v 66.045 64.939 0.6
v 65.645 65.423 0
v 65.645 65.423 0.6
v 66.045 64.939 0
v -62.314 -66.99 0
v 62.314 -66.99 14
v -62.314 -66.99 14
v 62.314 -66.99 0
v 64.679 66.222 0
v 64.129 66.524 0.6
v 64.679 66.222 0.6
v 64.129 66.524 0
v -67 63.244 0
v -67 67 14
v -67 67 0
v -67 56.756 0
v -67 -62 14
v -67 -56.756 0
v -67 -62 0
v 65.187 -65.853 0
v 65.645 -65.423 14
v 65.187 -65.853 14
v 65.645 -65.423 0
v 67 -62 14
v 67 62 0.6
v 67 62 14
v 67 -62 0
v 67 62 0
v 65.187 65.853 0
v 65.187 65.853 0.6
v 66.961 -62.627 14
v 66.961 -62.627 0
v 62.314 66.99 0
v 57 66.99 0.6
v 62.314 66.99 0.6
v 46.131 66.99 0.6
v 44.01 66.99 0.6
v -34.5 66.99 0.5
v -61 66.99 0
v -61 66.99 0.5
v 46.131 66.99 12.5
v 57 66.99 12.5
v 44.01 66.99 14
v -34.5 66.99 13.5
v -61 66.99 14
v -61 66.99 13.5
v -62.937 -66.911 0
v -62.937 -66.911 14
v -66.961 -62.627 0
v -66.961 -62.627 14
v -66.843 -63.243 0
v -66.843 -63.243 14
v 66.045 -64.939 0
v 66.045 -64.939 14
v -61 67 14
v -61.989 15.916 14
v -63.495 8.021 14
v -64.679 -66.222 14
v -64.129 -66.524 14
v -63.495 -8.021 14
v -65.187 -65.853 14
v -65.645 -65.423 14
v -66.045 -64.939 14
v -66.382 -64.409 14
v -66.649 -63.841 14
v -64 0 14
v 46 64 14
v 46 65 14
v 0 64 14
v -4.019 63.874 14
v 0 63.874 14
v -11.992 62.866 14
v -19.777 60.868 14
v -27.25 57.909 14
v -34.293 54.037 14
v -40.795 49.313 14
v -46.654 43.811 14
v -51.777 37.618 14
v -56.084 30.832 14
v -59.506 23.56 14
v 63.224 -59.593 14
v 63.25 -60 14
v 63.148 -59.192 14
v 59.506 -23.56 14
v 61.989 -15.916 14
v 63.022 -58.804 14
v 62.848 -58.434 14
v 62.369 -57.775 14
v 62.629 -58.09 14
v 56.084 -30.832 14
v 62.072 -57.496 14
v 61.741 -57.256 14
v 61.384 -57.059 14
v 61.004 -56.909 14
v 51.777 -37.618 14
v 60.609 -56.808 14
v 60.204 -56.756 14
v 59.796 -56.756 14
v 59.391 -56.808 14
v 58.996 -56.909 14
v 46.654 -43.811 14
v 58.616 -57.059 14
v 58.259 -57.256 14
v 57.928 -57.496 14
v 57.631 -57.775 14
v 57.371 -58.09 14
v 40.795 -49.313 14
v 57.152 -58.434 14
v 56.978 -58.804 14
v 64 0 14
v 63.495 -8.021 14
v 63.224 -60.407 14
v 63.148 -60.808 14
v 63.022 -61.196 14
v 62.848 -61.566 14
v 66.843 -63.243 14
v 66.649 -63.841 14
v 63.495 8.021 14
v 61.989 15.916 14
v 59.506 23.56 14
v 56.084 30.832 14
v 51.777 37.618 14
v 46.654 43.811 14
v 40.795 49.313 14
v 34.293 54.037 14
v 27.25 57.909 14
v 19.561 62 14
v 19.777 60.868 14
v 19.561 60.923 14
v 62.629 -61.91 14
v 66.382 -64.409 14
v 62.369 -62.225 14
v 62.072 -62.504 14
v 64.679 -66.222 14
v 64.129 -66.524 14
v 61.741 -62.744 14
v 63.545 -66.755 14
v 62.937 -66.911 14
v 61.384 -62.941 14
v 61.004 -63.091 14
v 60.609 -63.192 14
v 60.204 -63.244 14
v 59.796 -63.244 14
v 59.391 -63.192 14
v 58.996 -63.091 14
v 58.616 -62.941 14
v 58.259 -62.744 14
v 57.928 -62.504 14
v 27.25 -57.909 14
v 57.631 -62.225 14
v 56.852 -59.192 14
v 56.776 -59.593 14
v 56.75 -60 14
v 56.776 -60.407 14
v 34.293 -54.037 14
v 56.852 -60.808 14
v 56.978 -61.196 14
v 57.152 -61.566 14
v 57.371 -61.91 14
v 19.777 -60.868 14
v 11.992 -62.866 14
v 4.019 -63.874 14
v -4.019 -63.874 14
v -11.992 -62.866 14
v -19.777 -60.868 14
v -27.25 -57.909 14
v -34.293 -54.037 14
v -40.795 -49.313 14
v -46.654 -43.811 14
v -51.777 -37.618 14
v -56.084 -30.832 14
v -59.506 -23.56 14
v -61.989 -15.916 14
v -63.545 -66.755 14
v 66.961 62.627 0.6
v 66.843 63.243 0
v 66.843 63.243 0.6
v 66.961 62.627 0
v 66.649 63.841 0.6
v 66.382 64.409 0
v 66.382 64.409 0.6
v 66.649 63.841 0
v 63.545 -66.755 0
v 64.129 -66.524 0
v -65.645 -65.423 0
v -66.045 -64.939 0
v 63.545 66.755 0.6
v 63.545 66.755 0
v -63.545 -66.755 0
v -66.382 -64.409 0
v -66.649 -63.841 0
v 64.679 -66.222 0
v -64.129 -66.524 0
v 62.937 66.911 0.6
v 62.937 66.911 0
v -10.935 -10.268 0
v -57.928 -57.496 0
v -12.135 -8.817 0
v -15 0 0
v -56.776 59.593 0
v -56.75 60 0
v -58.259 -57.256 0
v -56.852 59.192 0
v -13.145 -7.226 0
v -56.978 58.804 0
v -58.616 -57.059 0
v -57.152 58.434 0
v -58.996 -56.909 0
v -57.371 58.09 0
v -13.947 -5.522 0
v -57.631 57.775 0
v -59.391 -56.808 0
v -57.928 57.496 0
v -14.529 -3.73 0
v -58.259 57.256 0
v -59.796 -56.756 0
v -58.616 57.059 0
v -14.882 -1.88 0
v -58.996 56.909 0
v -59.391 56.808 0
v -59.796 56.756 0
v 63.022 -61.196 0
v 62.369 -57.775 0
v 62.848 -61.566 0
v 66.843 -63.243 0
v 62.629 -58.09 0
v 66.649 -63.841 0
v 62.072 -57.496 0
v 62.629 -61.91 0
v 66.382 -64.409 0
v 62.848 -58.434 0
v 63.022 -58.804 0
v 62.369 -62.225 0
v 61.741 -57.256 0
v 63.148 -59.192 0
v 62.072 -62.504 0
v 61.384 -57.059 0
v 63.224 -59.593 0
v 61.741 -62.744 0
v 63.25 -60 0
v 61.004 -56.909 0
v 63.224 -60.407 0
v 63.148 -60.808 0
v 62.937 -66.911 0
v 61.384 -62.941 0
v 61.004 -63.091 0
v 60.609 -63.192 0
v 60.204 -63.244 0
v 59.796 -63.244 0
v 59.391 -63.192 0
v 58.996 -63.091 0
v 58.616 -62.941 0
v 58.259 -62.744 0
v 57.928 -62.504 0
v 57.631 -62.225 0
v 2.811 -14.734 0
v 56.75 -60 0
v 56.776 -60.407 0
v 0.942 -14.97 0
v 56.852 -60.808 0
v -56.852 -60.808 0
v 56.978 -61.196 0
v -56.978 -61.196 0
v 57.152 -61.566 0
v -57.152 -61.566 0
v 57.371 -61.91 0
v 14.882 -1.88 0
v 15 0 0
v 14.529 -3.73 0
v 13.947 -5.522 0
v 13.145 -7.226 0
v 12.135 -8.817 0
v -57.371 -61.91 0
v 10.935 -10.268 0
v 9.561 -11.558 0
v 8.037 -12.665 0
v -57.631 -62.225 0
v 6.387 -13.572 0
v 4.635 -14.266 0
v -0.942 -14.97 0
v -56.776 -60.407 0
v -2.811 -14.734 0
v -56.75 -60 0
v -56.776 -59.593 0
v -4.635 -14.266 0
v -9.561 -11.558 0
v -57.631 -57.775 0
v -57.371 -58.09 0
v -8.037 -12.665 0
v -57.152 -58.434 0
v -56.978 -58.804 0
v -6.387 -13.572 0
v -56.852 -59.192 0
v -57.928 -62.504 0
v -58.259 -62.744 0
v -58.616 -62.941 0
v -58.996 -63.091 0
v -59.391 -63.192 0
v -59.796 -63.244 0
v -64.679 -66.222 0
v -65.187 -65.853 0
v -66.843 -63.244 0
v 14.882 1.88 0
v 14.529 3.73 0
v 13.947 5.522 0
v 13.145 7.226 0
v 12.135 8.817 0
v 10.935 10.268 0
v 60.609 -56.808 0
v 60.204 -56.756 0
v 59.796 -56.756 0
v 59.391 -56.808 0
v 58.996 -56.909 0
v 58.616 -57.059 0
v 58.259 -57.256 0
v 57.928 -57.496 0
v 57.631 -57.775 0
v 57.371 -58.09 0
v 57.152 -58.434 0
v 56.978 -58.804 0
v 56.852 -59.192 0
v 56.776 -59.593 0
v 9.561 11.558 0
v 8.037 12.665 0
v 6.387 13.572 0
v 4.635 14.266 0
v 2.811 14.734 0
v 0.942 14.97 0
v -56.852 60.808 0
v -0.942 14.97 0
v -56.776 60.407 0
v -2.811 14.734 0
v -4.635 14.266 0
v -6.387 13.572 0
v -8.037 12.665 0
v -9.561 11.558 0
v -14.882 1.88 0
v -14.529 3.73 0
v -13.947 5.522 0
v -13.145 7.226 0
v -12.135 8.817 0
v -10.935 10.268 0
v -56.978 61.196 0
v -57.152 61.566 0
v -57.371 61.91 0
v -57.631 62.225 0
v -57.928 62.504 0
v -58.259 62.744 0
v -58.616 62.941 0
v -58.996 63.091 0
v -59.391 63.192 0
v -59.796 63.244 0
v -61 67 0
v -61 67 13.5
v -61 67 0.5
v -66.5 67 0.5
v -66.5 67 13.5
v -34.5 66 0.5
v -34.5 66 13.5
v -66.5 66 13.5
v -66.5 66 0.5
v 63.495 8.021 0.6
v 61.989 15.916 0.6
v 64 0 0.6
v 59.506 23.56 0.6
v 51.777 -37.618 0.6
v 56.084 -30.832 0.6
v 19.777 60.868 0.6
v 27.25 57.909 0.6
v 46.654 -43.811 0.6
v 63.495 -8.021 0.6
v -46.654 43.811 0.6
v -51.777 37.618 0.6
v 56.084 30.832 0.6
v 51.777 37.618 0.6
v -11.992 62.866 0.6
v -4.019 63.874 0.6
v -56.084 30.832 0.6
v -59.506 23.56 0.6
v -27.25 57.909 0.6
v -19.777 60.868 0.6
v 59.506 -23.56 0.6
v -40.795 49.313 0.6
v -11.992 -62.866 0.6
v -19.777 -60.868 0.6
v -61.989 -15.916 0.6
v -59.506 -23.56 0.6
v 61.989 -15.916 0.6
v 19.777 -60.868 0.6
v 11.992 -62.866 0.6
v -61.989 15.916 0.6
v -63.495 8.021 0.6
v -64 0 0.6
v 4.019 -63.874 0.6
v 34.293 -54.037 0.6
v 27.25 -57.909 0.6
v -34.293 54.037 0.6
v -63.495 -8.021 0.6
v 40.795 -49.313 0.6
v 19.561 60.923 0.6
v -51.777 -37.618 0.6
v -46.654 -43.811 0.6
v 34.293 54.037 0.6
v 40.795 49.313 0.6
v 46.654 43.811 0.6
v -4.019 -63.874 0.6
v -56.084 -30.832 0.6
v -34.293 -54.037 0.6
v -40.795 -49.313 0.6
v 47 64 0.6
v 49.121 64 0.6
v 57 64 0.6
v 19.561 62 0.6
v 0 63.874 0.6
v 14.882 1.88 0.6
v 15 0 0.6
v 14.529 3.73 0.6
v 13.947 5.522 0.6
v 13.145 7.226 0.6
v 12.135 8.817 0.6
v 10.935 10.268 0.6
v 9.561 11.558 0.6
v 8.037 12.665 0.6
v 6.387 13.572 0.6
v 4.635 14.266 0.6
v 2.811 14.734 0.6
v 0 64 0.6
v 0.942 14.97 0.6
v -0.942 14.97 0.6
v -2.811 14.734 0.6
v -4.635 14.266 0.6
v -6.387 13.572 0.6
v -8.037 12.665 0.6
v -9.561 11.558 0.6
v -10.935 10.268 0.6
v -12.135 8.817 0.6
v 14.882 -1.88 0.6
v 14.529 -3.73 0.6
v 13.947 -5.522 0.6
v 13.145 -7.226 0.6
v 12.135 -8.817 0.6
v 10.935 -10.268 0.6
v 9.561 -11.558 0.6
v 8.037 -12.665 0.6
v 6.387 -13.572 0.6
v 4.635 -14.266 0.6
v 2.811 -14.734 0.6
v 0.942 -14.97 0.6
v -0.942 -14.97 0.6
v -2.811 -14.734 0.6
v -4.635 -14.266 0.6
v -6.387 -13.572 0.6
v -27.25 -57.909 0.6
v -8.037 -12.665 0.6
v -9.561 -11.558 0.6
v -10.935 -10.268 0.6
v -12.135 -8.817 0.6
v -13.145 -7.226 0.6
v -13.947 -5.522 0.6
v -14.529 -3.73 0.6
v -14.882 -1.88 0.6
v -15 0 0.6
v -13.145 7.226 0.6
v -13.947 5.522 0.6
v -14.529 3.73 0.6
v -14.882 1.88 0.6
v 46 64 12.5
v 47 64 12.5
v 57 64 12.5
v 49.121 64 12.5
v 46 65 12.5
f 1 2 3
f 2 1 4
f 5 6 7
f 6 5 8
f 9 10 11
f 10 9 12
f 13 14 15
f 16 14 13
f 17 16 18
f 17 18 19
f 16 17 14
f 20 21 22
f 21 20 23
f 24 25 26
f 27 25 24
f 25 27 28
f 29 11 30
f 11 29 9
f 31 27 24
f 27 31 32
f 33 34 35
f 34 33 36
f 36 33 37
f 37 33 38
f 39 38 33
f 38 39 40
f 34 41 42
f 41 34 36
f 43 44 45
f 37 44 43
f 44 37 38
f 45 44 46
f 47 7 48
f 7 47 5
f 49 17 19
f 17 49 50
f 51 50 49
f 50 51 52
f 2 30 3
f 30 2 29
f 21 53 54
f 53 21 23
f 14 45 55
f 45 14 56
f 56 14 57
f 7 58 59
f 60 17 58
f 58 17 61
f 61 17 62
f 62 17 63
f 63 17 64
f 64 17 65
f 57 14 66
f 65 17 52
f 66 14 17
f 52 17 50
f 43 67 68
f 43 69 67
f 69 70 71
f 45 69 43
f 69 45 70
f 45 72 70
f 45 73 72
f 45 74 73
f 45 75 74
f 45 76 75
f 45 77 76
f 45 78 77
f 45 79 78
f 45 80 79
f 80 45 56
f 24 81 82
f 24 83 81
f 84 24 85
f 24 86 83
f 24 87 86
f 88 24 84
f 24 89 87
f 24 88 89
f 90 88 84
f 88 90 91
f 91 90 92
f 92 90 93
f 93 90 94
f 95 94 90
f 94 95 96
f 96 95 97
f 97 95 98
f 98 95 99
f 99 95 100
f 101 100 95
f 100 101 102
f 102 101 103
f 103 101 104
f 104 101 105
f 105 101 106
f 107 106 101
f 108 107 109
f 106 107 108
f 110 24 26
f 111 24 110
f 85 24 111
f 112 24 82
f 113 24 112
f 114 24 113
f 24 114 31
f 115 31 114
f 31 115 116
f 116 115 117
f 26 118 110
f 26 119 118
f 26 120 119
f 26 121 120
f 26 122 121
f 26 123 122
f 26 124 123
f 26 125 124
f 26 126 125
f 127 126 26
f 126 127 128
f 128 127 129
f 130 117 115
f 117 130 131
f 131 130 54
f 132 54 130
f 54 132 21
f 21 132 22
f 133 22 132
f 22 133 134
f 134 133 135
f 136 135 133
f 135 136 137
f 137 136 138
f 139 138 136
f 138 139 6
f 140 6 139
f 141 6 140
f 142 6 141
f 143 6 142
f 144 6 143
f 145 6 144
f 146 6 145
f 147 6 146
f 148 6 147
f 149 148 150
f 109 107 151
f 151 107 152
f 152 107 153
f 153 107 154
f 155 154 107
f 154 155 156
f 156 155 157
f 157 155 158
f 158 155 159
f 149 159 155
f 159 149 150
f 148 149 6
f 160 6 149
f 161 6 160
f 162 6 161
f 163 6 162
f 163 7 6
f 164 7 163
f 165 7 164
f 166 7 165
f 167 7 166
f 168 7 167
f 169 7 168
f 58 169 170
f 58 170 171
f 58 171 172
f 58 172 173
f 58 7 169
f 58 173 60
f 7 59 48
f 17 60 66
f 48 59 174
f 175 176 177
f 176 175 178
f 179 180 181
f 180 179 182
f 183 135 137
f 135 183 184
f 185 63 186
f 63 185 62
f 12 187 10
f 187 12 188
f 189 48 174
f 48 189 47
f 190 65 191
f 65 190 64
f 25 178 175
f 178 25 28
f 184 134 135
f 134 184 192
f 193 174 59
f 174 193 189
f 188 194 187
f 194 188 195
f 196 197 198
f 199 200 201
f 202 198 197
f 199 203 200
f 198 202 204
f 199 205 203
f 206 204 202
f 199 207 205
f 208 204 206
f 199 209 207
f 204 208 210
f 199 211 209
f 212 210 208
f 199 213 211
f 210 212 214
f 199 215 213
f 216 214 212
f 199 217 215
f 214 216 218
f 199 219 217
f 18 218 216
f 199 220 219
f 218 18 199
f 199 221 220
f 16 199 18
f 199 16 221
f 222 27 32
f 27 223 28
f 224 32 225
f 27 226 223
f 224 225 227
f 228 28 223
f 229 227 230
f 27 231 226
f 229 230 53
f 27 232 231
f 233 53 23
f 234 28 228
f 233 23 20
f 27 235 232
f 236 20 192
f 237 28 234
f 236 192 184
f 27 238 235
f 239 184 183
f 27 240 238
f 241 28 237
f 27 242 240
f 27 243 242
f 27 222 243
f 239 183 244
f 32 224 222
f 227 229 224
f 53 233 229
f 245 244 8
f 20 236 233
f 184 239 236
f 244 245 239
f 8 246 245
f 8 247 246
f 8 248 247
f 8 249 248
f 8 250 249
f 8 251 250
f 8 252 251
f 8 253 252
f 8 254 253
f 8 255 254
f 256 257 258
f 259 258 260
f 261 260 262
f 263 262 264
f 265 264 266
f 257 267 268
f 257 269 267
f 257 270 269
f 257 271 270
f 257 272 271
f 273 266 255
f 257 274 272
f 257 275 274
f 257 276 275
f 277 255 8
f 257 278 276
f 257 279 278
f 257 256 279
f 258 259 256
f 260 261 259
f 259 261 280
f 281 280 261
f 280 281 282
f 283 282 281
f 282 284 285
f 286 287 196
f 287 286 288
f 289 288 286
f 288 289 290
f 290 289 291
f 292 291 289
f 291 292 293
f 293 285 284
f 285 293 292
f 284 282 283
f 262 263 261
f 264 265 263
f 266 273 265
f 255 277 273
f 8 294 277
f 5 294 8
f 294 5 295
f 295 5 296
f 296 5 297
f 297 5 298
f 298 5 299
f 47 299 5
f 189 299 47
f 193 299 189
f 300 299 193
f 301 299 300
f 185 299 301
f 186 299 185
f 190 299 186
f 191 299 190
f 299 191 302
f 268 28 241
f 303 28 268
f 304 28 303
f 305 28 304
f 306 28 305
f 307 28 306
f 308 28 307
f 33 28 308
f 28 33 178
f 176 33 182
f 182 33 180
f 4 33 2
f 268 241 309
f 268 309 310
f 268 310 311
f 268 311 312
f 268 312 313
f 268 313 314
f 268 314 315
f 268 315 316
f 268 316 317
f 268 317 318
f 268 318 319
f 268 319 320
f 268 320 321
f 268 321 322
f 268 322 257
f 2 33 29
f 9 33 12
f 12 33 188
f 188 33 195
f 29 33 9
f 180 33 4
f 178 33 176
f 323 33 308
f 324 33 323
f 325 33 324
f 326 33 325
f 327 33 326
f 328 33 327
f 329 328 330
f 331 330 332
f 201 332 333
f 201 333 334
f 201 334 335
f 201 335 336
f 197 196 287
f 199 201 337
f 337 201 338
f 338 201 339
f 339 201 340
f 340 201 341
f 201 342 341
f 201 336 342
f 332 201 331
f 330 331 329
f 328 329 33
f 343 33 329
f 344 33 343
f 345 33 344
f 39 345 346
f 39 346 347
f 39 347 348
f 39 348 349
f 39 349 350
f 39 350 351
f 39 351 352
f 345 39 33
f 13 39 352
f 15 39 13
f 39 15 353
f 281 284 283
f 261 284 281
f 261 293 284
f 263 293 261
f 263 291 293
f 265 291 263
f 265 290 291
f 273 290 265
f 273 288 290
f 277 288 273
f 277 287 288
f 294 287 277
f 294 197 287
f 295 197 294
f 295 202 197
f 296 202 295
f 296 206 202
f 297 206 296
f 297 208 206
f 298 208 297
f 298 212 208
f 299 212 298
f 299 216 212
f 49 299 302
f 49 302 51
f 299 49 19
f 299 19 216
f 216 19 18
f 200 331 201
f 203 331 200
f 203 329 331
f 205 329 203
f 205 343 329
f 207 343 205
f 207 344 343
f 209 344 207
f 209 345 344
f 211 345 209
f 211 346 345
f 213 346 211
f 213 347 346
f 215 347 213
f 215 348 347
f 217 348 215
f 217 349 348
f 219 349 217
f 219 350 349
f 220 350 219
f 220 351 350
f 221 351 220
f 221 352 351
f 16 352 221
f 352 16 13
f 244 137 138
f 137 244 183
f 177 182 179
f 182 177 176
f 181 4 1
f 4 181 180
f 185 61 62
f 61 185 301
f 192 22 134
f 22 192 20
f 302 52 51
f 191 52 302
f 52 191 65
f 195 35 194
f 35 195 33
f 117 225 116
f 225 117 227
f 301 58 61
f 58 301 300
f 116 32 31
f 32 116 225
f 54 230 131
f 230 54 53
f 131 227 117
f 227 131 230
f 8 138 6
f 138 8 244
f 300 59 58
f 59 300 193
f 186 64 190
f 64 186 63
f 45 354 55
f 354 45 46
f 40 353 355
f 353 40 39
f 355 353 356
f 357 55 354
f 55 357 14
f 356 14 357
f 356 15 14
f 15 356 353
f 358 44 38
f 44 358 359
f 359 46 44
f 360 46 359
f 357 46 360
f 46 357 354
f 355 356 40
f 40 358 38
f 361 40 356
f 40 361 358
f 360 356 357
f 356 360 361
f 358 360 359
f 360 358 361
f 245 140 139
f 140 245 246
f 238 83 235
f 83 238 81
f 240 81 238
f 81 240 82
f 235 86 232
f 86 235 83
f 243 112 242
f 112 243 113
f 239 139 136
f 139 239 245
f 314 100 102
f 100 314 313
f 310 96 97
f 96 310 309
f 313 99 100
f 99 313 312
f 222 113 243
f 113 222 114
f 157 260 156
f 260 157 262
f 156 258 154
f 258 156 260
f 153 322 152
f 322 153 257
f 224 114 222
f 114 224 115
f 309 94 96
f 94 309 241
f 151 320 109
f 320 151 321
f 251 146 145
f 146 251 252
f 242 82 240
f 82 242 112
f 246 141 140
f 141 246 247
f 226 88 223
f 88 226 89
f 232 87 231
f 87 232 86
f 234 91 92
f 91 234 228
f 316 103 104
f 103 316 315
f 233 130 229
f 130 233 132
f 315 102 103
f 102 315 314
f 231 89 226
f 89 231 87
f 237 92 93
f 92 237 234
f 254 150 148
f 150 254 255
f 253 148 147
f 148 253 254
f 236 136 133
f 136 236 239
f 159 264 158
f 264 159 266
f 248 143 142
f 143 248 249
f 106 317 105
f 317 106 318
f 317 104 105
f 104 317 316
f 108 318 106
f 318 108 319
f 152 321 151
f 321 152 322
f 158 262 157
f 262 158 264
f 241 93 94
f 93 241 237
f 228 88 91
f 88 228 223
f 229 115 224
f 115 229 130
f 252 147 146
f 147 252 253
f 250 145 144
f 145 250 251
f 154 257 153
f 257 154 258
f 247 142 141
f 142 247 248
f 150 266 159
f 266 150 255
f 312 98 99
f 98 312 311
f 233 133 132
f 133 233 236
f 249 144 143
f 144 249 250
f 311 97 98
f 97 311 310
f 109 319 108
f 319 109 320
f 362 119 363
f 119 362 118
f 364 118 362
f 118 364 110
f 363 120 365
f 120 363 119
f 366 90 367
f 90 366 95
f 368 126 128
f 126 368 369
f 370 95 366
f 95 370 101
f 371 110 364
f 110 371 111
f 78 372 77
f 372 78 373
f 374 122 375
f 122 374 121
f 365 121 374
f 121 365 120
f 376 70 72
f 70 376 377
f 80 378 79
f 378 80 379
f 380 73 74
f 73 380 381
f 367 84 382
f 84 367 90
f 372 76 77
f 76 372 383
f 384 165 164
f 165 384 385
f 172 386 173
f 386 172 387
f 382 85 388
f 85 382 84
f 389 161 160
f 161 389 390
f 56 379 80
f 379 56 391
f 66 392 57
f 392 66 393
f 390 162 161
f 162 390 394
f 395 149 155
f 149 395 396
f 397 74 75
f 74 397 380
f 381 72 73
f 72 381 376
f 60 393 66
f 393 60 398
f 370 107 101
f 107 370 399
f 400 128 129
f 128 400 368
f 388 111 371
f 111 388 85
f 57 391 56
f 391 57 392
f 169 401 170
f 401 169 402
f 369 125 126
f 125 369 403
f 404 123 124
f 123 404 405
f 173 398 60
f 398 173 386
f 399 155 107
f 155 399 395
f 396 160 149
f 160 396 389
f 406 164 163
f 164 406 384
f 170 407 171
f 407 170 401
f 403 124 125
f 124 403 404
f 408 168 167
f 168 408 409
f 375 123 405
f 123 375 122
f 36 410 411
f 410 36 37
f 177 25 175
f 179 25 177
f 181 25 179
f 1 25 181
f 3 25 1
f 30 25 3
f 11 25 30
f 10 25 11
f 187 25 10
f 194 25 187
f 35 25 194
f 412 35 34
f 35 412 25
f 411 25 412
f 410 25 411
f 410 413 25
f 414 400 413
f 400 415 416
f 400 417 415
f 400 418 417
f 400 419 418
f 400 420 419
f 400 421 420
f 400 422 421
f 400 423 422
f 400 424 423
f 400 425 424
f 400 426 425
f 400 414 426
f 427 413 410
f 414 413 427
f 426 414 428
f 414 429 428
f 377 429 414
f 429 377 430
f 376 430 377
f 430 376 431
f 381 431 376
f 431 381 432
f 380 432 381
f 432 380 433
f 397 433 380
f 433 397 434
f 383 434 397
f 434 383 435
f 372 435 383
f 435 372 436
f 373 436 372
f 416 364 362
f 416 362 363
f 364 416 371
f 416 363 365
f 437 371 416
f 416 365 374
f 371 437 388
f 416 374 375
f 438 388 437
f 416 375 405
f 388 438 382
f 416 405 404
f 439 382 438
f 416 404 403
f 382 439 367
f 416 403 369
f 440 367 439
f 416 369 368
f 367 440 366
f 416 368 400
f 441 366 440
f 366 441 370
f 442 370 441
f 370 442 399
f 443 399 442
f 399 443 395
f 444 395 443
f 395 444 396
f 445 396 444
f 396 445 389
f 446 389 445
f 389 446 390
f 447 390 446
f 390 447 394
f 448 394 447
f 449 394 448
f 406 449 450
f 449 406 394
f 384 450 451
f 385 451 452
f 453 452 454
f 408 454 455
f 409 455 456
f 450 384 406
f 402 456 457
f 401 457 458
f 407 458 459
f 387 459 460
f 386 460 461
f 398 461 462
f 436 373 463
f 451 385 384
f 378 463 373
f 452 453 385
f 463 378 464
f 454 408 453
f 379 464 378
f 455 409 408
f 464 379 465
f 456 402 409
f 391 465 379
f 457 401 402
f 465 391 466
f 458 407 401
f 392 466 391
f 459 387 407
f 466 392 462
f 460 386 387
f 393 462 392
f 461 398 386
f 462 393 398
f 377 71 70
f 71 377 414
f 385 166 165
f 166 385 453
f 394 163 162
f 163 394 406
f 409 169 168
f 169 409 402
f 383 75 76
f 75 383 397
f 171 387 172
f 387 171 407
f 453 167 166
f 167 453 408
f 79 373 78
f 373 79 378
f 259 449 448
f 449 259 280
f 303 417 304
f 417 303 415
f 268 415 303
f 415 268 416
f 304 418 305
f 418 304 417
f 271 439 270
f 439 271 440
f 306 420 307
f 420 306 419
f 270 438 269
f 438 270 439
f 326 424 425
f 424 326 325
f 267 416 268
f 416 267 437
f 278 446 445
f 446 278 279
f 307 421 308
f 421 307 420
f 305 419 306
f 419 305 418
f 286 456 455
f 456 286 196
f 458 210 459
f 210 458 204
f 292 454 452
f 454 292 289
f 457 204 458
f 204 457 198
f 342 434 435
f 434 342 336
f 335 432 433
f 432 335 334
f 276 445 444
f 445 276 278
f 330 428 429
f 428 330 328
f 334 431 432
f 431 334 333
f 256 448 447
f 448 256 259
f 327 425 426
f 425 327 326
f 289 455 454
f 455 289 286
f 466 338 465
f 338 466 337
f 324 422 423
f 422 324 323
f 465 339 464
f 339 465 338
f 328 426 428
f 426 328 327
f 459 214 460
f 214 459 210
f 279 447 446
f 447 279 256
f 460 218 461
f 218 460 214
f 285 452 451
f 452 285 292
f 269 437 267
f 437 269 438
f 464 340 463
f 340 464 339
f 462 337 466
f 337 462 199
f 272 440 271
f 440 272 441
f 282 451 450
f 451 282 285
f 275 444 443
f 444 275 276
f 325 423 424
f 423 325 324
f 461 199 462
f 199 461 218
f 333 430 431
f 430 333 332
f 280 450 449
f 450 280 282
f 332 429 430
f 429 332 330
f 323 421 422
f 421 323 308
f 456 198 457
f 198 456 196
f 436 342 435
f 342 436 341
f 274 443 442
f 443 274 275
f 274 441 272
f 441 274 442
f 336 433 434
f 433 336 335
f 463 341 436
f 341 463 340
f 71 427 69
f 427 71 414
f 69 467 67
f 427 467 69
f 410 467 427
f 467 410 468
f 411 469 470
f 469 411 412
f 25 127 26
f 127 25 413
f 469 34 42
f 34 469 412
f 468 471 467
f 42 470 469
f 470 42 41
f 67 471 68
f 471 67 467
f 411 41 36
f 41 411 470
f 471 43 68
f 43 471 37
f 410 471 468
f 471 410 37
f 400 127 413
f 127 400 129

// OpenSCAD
$fn = 50;


difference() {
	union() {
		hull() {
			translate(v = [-62.0000000000, 62.0000000000, 0]) {
				cylinder(h = 14, r = 5);
			}
			translate(v = [62.0000000000, 62.0000000000, 0]) {
				cylinder(h = 14, r = 5);
			}
			translate(v = [-62.0000000000, -62.0000000000, 0]) {
				cylinder(h = 14, r = 5);
			}
			translate(v = [62.0000000000, -62.0000000000, 0]) {
				cylinder(h = 14, r = 5);
			}
		}
		translate(v = [-67.0000000000, 61.0000000000, 0]) {
			cube(size = [6, 6, 14]);
		}
	}
	union() {
		translate(v = [-67.5000000000, -60.0000000000, -250.0000000000]) {
			rotate(a = [0, 0, 0]) {
				difference() {
					union() {
						hull() {
							translate(v = [7.5000000000, 0, 0]) {
								cylinder(h = 250, r = 3.2500000000, r1 = 3.2500000000, r2 = 3.2500000000);
							}
							translate(v = [-7.5000000000, 0, 0]) {
								cylinder(h = 250, r = 3.2500000000, r1 = 3.2500000000, r2 = 3.2500000000);
							}
						}
					}
					union();
				}
			}
		}
		translate(v = [-67.5000000000, 60.0000000000, -250.0000000000]) {
			rotate(a = [0, 0, 0]) {
				difference() {
					union() {
						hull() {
							translate(v = [7.5000000000, 0, 0]) {
								cylinder(h = 250, r = 3.2500000000, r1 = 3.2500000000, r2 = 3.2500000000);
							}
							translate(v = [-7.5000000000, 0, 0]) {
								cylinder(h = 250, r = 3.2500000000, r1 = 3.2500000000, r2 = 3.2500000000);
							}
						}
					}
					union();
				}
			}
		}
		translate(v = [-66.5000000000, 66.0000000000, 0.5000000000]) {
			cube(size = [32, 1, 13.0000000000]);
		}
		translate(v = [60.0000000000, -60.0000000000, -50.0000000000]) {
			cylinder(h = 100, r = 3.2500000000);
		}
		translate(v = [0, 0, 0.6000000000]) {
			cylinder(h = 16.4000000000, r = 64.0000000000);
		}
		translate(v = [0, 0, -7.0000000000]) {
			cylinder(h = 14, r = 15.0000000000);
		}
		translate(v = [0.0000000000, 62.0000000000, 0.6000000000]) {
			cube(size = [67.0000000000, 2, 16.4000000000]);
		}
		translate(v = [57.0000000000, 62.0000000000, 0.6000000000]) {
			cube(size = [10, 5, 16.4000000000]);
		}
		translate(v = [46.0000000000, 62.0000000000, 12.5000000000]) {
			cube(size = [21, 5, 1.5000000000]);
		}
		translate(v = [43.2500000000, 67.7500000000, 0.6000000000]) {
			rotate(a = [0, 0, -45]) {
				cube(size = [7.5000000000, 1.5000000000, 16.4000000000]);
			}
		}
		translate(v = [12.0610000000, 60.0000000000, 0.6000000000]) {
			cube(size = [7.5000000000, 2, 13.4000000000]);
		}
	}
}
